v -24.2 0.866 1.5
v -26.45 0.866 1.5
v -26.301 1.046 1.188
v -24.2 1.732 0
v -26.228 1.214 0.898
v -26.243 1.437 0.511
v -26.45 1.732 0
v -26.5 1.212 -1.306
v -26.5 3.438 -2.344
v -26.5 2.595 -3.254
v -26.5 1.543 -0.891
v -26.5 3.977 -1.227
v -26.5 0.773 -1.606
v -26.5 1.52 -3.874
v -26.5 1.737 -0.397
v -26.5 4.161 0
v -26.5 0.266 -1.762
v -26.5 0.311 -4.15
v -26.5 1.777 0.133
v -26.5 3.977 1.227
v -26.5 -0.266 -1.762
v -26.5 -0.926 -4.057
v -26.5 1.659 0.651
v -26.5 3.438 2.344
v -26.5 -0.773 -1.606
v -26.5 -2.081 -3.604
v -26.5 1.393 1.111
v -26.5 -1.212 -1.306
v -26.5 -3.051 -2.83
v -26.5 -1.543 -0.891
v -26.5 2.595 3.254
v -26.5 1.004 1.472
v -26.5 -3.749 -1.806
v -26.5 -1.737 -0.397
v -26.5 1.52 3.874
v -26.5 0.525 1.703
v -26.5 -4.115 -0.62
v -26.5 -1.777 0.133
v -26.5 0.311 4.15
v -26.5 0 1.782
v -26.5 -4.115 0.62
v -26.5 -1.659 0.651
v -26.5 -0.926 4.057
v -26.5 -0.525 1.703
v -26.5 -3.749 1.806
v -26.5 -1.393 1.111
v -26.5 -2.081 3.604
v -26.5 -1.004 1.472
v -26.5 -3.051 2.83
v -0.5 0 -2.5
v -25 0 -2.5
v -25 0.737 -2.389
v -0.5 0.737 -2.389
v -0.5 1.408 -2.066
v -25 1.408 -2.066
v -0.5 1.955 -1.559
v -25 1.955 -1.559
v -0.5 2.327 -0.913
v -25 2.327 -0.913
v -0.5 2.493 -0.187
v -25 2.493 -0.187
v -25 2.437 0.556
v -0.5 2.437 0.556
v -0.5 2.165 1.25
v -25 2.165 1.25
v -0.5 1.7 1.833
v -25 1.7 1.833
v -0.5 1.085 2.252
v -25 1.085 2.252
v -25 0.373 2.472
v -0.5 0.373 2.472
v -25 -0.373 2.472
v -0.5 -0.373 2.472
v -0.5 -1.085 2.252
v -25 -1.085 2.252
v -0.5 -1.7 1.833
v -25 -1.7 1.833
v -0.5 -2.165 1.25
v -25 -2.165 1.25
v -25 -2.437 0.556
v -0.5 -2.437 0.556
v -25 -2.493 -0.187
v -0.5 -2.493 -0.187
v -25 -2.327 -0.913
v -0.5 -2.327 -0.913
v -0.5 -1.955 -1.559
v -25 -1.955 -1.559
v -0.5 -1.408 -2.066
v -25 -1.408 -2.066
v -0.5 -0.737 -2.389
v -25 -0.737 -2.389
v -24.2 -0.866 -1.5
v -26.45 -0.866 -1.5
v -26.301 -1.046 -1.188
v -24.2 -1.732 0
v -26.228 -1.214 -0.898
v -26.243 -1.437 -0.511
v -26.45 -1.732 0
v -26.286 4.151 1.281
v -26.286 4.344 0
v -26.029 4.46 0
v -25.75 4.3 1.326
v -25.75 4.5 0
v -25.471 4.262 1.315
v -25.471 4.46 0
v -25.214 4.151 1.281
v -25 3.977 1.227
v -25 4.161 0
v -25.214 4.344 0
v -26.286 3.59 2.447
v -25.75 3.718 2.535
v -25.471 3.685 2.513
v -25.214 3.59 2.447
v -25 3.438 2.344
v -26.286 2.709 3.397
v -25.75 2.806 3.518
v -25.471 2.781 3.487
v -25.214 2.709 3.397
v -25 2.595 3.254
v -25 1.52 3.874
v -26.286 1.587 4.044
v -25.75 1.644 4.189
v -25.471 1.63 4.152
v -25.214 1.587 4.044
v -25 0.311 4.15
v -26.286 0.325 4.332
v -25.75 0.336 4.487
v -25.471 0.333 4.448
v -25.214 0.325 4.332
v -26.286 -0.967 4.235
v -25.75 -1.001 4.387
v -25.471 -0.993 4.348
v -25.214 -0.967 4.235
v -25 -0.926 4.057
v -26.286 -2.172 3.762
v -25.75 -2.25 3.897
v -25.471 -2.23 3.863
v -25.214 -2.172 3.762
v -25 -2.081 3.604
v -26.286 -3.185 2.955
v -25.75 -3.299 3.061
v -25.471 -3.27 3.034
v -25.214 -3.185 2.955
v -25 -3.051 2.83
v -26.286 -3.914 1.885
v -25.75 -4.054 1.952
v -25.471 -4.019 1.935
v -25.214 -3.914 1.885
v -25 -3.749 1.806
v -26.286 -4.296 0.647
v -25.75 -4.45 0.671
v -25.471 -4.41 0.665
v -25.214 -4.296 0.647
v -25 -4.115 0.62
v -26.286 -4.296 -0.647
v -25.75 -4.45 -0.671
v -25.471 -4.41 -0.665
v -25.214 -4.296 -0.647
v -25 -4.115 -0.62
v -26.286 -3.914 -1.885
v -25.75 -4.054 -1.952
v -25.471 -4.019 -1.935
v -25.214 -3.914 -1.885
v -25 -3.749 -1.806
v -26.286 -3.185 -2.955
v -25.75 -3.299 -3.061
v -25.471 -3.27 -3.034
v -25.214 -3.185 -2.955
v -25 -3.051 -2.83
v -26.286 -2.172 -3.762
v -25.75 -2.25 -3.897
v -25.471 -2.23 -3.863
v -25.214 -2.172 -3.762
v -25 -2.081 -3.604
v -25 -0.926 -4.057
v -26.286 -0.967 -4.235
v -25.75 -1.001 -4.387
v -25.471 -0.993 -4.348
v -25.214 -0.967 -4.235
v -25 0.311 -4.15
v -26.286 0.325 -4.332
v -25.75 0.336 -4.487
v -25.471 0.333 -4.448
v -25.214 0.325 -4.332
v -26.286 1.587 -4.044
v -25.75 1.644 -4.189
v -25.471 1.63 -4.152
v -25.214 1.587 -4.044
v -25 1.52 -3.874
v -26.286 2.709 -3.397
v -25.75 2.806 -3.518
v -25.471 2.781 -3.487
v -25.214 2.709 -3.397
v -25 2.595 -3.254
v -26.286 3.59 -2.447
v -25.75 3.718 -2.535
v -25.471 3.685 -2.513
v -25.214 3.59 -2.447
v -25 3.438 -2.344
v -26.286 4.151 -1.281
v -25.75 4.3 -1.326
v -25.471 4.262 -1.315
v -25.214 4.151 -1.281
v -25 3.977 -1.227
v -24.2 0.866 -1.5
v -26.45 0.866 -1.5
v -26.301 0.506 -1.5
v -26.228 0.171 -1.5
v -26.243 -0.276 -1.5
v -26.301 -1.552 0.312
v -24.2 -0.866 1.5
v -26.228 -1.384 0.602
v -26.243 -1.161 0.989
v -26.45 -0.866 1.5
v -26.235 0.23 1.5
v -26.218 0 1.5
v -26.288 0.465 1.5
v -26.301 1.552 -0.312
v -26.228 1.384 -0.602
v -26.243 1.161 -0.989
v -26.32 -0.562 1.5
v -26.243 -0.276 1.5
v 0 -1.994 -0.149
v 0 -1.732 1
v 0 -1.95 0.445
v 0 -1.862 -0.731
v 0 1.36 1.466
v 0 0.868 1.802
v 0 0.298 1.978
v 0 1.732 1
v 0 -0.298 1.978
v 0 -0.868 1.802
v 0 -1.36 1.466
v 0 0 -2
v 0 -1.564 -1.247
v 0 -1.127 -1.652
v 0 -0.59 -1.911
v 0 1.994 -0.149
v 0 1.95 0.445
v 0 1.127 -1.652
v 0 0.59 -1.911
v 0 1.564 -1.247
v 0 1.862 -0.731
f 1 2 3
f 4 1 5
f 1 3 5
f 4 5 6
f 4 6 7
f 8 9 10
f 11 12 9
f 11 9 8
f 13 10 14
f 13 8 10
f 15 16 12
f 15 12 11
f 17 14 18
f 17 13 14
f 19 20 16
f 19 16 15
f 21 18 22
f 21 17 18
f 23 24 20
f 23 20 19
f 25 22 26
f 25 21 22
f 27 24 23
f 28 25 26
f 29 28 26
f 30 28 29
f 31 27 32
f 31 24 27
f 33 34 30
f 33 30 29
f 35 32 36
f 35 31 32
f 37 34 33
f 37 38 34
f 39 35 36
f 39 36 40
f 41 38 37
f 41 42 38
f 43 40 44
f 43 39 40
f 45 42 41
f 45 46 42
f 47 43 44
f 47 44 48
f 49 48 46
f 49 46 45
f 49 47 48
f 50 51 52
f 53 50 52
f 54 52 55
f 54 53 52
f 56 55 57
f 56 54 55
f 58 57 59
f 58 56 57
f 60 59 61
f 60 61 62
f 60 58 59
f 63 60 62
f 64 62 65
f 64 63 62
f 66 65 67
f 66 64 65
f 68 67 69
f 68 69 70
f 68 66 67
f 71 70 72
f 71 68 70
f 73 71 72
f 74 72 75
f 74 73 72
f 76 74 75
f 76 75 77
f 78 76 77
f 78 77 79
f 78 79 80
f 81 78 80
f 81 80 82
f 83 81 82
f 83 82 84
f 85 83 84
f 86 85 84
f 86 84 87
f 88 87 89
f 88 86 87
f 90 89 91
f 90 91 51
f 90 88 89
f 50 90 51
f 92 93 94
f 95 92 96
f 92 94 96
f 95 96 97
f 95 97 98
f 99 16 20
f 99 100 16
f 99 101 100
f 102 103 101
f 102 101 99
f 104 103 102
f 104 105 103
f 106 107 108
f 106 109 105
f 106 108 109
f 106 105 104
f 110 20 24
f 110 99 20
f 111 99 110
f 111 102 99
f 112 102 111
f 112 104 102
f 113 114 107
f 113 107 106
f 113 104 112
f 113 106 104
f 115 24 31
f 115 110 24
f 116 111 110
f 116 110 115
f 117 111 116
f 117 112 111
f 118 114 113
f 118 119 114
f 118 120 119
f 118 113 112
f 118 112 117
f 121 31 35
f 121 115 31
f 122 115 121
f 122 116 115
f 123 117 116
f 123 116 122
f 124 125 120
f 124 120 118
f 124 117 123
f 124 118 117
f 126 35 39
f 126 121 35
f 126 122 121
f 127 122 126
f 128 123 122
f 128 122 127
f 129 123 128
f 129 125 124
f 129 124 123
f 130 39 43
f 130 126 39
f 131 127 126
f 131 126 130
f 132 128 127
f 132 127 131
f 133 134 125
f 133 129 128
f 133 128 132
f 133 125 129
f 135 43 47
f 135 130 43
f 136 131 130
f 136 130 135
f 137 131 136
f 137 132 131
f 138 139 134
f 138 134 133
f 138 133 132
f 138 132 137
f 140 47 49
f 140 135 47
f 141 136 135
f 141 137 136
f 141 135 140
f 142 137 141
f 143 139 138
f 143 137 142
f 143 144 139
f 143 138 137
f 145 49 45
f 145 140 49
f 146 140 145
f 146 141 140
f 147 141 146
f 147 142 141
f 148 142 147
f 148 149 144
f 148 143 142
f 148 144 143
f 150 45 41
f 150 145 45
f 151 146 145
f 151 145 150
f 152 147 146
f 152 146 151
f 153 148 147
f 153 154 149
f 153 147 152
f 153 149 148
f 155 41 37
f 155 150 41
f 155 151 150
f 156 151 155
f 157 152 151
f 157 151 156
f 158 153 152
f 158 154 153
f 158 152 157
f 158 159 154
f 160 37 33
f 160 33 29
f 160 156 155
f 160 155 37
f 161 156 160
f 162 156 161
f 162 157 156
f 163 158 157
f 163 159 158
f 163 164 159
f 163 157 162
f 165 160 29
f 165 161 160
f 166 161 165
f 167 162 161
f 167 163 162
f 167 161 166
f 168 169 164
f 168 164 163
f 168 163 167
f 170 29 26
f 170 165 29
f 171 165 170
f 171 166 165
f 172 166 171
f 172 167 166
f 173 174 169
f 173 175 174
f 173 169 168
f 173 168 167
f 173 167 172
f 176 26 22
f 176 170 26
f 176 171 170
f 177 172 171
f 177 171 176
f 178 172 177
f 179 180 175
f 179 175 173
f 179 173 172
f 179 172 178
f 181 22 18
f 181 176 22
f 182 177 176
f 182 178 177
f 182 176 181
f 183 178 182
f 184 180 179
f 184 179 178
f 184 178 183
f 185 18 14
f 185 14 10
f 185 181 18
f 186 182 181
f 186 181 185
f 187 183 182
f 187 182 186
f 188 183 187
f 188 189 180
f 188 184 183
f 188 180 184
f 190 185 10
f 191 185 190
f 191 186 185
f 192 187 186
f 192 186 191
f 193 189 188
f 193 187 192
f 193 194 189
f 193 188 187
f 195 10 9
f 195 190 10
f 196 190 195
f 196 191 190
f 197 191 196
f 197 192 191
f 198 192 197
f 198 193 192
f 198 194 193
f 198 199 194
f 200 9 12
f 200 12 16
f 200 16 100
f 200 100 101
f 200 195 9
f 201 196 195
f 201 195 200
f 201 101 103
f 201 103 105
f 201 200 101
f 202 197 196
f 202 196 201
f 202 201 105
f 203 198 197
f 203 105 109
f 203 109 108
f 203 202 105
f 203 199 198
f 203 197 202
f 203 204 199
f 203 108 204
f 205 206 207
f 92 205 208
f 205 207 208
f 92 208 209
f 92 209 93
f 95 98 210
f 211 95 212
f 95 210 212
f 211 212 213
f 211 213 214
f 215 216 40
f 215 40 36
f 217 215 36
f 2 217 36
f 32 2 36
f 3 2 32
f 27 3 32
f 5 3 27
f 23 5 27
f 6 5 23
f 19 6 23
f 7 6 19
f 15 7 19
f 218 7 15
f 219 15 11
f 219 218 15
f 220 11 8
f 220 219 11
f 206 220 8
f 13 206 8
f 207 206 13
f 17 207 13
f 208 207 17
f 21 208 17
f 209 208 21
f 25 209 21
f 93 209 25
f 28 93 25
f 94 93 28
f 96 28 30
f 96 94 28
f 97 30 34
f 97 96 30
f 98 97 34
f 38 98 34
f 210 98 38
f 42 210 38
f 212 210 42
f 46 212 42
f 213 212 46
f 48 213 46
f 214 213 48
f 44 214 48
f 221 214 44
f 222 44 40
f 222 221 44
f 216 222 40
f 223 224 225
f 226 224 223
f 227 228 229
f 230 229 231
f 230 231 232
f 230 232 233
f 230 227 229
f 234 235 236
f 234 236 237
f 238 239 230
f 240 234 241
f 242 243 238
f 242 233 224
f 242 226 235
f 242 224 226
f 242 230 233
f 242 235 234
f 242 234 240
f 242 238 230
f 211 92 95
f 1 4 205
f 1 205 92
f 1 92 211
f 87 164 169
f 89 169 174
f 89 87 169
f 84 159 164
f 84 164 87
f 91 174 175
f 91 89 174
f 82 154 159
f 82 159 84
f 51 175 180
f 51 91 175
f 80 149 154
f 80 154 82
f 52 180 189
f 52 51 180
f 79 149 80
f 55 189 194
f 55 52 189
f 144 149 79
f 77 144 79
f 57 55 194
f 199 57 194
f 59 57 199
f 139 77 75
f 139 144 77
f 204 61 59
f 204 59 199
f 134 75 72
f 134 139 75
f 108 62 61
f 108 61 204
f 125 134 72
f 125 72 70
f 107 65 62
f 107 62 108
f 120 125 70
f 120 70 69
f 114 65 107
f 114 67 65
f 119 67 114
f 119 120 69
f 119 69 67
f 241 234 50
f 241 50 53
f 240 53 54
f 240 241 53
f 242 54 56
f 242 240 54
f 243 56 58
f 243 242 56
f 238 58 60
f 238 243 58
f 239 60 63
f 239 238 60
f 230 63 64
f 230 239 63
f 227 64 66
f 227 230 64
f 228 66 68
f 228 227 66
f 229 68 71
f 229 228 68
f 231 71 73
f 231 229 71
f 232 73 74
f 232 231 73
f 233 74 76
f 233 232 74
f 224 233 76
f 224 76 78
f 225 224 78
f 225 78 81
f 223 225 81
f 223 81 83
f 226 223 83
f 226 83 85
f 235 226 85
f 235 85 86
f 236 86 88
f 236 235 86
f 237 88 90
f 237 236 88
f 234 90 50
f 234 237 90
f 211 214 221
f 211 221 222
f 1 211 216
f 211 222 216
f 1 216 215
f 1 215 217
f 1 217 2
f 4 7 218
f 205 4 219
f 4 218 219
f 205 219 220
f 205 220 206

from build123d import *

# Parameters (mm, degrees)
SKETCH2_R           = 2.5
BOSS_EXTRUDE1_DEPTH = 25
CHAMFER1_SIZE       = 0.5
CUT_EXTRUDE1_DEPTH  = 2.3
SKETCH8_R           = 1.782050808
CUT_EXTRUDE2_DEPTH  = 1
CUT_EXTRUDE2_TAPER  = 45


with BuildPart() as part:
    # Sketch2 → Boss-Extrude1 (new body)
    with BuildSketch(Plane(origin=(0, 0, 0), x_dir=(0, 0, -1), z_dir=(1, 0, 0))):
        Circle(SKETCH2_R)
    extrude(amount=-BOSS_EXTRUDE1_DEPTH)

    # Chamfer1
    chamfer1_edges = [part.edges().sort_by_distance(p)[0] for p in [
        (0, 0, 2.5),
    ]]
    chamfer(chamfer1_edges, length=CHAMFER1_SIZE)

    # Sketch6 → Revolve1 (revolve)
    with BuildSketch(Plane.XY):
        with BuildLine():
            Line((-26.5, 0), (-26.5, 4.161437828))
            ThreePointArc((-26.5, 4.161437828), (-25.75, 4.5), (-25, 4.161437828))
            Line((-25, 4.161437828), (-25, 0))
            Line((-25, 0), (-26.5, 0))
        make_face()
    revolve(axis=Axis((-25, 0, 0), (1, 0, 0)))

    # Sketch7 → Cut-Extrude1 (cut)
    with BuildSketch(Plane.ZY.offset(26.5)):
        Polygon((0, 1.732050808), (-1.5, 0.866025404), (-1.5, -0.866025404), (0, -1.732050808), (1.5, -0.866025404), (1.5, 0.866025404), align=None)
    extrude(amount=-CUT_EXTRUDE1_DEPTH, mode=Mode.SUBTRACT)

    # Sketch8 → Cut-Extrude2 (cut)
    with BuildSketch(Plane.ZY.offset(26.5)):
        Circle(SKETCH8_R)
    extrude(amount=-CUT_EXTRUDE2_DEPTH, taper=CUT_EXTRUDE2_TAPER, mode=Mode.SUBTRACT)


solid = part.part
